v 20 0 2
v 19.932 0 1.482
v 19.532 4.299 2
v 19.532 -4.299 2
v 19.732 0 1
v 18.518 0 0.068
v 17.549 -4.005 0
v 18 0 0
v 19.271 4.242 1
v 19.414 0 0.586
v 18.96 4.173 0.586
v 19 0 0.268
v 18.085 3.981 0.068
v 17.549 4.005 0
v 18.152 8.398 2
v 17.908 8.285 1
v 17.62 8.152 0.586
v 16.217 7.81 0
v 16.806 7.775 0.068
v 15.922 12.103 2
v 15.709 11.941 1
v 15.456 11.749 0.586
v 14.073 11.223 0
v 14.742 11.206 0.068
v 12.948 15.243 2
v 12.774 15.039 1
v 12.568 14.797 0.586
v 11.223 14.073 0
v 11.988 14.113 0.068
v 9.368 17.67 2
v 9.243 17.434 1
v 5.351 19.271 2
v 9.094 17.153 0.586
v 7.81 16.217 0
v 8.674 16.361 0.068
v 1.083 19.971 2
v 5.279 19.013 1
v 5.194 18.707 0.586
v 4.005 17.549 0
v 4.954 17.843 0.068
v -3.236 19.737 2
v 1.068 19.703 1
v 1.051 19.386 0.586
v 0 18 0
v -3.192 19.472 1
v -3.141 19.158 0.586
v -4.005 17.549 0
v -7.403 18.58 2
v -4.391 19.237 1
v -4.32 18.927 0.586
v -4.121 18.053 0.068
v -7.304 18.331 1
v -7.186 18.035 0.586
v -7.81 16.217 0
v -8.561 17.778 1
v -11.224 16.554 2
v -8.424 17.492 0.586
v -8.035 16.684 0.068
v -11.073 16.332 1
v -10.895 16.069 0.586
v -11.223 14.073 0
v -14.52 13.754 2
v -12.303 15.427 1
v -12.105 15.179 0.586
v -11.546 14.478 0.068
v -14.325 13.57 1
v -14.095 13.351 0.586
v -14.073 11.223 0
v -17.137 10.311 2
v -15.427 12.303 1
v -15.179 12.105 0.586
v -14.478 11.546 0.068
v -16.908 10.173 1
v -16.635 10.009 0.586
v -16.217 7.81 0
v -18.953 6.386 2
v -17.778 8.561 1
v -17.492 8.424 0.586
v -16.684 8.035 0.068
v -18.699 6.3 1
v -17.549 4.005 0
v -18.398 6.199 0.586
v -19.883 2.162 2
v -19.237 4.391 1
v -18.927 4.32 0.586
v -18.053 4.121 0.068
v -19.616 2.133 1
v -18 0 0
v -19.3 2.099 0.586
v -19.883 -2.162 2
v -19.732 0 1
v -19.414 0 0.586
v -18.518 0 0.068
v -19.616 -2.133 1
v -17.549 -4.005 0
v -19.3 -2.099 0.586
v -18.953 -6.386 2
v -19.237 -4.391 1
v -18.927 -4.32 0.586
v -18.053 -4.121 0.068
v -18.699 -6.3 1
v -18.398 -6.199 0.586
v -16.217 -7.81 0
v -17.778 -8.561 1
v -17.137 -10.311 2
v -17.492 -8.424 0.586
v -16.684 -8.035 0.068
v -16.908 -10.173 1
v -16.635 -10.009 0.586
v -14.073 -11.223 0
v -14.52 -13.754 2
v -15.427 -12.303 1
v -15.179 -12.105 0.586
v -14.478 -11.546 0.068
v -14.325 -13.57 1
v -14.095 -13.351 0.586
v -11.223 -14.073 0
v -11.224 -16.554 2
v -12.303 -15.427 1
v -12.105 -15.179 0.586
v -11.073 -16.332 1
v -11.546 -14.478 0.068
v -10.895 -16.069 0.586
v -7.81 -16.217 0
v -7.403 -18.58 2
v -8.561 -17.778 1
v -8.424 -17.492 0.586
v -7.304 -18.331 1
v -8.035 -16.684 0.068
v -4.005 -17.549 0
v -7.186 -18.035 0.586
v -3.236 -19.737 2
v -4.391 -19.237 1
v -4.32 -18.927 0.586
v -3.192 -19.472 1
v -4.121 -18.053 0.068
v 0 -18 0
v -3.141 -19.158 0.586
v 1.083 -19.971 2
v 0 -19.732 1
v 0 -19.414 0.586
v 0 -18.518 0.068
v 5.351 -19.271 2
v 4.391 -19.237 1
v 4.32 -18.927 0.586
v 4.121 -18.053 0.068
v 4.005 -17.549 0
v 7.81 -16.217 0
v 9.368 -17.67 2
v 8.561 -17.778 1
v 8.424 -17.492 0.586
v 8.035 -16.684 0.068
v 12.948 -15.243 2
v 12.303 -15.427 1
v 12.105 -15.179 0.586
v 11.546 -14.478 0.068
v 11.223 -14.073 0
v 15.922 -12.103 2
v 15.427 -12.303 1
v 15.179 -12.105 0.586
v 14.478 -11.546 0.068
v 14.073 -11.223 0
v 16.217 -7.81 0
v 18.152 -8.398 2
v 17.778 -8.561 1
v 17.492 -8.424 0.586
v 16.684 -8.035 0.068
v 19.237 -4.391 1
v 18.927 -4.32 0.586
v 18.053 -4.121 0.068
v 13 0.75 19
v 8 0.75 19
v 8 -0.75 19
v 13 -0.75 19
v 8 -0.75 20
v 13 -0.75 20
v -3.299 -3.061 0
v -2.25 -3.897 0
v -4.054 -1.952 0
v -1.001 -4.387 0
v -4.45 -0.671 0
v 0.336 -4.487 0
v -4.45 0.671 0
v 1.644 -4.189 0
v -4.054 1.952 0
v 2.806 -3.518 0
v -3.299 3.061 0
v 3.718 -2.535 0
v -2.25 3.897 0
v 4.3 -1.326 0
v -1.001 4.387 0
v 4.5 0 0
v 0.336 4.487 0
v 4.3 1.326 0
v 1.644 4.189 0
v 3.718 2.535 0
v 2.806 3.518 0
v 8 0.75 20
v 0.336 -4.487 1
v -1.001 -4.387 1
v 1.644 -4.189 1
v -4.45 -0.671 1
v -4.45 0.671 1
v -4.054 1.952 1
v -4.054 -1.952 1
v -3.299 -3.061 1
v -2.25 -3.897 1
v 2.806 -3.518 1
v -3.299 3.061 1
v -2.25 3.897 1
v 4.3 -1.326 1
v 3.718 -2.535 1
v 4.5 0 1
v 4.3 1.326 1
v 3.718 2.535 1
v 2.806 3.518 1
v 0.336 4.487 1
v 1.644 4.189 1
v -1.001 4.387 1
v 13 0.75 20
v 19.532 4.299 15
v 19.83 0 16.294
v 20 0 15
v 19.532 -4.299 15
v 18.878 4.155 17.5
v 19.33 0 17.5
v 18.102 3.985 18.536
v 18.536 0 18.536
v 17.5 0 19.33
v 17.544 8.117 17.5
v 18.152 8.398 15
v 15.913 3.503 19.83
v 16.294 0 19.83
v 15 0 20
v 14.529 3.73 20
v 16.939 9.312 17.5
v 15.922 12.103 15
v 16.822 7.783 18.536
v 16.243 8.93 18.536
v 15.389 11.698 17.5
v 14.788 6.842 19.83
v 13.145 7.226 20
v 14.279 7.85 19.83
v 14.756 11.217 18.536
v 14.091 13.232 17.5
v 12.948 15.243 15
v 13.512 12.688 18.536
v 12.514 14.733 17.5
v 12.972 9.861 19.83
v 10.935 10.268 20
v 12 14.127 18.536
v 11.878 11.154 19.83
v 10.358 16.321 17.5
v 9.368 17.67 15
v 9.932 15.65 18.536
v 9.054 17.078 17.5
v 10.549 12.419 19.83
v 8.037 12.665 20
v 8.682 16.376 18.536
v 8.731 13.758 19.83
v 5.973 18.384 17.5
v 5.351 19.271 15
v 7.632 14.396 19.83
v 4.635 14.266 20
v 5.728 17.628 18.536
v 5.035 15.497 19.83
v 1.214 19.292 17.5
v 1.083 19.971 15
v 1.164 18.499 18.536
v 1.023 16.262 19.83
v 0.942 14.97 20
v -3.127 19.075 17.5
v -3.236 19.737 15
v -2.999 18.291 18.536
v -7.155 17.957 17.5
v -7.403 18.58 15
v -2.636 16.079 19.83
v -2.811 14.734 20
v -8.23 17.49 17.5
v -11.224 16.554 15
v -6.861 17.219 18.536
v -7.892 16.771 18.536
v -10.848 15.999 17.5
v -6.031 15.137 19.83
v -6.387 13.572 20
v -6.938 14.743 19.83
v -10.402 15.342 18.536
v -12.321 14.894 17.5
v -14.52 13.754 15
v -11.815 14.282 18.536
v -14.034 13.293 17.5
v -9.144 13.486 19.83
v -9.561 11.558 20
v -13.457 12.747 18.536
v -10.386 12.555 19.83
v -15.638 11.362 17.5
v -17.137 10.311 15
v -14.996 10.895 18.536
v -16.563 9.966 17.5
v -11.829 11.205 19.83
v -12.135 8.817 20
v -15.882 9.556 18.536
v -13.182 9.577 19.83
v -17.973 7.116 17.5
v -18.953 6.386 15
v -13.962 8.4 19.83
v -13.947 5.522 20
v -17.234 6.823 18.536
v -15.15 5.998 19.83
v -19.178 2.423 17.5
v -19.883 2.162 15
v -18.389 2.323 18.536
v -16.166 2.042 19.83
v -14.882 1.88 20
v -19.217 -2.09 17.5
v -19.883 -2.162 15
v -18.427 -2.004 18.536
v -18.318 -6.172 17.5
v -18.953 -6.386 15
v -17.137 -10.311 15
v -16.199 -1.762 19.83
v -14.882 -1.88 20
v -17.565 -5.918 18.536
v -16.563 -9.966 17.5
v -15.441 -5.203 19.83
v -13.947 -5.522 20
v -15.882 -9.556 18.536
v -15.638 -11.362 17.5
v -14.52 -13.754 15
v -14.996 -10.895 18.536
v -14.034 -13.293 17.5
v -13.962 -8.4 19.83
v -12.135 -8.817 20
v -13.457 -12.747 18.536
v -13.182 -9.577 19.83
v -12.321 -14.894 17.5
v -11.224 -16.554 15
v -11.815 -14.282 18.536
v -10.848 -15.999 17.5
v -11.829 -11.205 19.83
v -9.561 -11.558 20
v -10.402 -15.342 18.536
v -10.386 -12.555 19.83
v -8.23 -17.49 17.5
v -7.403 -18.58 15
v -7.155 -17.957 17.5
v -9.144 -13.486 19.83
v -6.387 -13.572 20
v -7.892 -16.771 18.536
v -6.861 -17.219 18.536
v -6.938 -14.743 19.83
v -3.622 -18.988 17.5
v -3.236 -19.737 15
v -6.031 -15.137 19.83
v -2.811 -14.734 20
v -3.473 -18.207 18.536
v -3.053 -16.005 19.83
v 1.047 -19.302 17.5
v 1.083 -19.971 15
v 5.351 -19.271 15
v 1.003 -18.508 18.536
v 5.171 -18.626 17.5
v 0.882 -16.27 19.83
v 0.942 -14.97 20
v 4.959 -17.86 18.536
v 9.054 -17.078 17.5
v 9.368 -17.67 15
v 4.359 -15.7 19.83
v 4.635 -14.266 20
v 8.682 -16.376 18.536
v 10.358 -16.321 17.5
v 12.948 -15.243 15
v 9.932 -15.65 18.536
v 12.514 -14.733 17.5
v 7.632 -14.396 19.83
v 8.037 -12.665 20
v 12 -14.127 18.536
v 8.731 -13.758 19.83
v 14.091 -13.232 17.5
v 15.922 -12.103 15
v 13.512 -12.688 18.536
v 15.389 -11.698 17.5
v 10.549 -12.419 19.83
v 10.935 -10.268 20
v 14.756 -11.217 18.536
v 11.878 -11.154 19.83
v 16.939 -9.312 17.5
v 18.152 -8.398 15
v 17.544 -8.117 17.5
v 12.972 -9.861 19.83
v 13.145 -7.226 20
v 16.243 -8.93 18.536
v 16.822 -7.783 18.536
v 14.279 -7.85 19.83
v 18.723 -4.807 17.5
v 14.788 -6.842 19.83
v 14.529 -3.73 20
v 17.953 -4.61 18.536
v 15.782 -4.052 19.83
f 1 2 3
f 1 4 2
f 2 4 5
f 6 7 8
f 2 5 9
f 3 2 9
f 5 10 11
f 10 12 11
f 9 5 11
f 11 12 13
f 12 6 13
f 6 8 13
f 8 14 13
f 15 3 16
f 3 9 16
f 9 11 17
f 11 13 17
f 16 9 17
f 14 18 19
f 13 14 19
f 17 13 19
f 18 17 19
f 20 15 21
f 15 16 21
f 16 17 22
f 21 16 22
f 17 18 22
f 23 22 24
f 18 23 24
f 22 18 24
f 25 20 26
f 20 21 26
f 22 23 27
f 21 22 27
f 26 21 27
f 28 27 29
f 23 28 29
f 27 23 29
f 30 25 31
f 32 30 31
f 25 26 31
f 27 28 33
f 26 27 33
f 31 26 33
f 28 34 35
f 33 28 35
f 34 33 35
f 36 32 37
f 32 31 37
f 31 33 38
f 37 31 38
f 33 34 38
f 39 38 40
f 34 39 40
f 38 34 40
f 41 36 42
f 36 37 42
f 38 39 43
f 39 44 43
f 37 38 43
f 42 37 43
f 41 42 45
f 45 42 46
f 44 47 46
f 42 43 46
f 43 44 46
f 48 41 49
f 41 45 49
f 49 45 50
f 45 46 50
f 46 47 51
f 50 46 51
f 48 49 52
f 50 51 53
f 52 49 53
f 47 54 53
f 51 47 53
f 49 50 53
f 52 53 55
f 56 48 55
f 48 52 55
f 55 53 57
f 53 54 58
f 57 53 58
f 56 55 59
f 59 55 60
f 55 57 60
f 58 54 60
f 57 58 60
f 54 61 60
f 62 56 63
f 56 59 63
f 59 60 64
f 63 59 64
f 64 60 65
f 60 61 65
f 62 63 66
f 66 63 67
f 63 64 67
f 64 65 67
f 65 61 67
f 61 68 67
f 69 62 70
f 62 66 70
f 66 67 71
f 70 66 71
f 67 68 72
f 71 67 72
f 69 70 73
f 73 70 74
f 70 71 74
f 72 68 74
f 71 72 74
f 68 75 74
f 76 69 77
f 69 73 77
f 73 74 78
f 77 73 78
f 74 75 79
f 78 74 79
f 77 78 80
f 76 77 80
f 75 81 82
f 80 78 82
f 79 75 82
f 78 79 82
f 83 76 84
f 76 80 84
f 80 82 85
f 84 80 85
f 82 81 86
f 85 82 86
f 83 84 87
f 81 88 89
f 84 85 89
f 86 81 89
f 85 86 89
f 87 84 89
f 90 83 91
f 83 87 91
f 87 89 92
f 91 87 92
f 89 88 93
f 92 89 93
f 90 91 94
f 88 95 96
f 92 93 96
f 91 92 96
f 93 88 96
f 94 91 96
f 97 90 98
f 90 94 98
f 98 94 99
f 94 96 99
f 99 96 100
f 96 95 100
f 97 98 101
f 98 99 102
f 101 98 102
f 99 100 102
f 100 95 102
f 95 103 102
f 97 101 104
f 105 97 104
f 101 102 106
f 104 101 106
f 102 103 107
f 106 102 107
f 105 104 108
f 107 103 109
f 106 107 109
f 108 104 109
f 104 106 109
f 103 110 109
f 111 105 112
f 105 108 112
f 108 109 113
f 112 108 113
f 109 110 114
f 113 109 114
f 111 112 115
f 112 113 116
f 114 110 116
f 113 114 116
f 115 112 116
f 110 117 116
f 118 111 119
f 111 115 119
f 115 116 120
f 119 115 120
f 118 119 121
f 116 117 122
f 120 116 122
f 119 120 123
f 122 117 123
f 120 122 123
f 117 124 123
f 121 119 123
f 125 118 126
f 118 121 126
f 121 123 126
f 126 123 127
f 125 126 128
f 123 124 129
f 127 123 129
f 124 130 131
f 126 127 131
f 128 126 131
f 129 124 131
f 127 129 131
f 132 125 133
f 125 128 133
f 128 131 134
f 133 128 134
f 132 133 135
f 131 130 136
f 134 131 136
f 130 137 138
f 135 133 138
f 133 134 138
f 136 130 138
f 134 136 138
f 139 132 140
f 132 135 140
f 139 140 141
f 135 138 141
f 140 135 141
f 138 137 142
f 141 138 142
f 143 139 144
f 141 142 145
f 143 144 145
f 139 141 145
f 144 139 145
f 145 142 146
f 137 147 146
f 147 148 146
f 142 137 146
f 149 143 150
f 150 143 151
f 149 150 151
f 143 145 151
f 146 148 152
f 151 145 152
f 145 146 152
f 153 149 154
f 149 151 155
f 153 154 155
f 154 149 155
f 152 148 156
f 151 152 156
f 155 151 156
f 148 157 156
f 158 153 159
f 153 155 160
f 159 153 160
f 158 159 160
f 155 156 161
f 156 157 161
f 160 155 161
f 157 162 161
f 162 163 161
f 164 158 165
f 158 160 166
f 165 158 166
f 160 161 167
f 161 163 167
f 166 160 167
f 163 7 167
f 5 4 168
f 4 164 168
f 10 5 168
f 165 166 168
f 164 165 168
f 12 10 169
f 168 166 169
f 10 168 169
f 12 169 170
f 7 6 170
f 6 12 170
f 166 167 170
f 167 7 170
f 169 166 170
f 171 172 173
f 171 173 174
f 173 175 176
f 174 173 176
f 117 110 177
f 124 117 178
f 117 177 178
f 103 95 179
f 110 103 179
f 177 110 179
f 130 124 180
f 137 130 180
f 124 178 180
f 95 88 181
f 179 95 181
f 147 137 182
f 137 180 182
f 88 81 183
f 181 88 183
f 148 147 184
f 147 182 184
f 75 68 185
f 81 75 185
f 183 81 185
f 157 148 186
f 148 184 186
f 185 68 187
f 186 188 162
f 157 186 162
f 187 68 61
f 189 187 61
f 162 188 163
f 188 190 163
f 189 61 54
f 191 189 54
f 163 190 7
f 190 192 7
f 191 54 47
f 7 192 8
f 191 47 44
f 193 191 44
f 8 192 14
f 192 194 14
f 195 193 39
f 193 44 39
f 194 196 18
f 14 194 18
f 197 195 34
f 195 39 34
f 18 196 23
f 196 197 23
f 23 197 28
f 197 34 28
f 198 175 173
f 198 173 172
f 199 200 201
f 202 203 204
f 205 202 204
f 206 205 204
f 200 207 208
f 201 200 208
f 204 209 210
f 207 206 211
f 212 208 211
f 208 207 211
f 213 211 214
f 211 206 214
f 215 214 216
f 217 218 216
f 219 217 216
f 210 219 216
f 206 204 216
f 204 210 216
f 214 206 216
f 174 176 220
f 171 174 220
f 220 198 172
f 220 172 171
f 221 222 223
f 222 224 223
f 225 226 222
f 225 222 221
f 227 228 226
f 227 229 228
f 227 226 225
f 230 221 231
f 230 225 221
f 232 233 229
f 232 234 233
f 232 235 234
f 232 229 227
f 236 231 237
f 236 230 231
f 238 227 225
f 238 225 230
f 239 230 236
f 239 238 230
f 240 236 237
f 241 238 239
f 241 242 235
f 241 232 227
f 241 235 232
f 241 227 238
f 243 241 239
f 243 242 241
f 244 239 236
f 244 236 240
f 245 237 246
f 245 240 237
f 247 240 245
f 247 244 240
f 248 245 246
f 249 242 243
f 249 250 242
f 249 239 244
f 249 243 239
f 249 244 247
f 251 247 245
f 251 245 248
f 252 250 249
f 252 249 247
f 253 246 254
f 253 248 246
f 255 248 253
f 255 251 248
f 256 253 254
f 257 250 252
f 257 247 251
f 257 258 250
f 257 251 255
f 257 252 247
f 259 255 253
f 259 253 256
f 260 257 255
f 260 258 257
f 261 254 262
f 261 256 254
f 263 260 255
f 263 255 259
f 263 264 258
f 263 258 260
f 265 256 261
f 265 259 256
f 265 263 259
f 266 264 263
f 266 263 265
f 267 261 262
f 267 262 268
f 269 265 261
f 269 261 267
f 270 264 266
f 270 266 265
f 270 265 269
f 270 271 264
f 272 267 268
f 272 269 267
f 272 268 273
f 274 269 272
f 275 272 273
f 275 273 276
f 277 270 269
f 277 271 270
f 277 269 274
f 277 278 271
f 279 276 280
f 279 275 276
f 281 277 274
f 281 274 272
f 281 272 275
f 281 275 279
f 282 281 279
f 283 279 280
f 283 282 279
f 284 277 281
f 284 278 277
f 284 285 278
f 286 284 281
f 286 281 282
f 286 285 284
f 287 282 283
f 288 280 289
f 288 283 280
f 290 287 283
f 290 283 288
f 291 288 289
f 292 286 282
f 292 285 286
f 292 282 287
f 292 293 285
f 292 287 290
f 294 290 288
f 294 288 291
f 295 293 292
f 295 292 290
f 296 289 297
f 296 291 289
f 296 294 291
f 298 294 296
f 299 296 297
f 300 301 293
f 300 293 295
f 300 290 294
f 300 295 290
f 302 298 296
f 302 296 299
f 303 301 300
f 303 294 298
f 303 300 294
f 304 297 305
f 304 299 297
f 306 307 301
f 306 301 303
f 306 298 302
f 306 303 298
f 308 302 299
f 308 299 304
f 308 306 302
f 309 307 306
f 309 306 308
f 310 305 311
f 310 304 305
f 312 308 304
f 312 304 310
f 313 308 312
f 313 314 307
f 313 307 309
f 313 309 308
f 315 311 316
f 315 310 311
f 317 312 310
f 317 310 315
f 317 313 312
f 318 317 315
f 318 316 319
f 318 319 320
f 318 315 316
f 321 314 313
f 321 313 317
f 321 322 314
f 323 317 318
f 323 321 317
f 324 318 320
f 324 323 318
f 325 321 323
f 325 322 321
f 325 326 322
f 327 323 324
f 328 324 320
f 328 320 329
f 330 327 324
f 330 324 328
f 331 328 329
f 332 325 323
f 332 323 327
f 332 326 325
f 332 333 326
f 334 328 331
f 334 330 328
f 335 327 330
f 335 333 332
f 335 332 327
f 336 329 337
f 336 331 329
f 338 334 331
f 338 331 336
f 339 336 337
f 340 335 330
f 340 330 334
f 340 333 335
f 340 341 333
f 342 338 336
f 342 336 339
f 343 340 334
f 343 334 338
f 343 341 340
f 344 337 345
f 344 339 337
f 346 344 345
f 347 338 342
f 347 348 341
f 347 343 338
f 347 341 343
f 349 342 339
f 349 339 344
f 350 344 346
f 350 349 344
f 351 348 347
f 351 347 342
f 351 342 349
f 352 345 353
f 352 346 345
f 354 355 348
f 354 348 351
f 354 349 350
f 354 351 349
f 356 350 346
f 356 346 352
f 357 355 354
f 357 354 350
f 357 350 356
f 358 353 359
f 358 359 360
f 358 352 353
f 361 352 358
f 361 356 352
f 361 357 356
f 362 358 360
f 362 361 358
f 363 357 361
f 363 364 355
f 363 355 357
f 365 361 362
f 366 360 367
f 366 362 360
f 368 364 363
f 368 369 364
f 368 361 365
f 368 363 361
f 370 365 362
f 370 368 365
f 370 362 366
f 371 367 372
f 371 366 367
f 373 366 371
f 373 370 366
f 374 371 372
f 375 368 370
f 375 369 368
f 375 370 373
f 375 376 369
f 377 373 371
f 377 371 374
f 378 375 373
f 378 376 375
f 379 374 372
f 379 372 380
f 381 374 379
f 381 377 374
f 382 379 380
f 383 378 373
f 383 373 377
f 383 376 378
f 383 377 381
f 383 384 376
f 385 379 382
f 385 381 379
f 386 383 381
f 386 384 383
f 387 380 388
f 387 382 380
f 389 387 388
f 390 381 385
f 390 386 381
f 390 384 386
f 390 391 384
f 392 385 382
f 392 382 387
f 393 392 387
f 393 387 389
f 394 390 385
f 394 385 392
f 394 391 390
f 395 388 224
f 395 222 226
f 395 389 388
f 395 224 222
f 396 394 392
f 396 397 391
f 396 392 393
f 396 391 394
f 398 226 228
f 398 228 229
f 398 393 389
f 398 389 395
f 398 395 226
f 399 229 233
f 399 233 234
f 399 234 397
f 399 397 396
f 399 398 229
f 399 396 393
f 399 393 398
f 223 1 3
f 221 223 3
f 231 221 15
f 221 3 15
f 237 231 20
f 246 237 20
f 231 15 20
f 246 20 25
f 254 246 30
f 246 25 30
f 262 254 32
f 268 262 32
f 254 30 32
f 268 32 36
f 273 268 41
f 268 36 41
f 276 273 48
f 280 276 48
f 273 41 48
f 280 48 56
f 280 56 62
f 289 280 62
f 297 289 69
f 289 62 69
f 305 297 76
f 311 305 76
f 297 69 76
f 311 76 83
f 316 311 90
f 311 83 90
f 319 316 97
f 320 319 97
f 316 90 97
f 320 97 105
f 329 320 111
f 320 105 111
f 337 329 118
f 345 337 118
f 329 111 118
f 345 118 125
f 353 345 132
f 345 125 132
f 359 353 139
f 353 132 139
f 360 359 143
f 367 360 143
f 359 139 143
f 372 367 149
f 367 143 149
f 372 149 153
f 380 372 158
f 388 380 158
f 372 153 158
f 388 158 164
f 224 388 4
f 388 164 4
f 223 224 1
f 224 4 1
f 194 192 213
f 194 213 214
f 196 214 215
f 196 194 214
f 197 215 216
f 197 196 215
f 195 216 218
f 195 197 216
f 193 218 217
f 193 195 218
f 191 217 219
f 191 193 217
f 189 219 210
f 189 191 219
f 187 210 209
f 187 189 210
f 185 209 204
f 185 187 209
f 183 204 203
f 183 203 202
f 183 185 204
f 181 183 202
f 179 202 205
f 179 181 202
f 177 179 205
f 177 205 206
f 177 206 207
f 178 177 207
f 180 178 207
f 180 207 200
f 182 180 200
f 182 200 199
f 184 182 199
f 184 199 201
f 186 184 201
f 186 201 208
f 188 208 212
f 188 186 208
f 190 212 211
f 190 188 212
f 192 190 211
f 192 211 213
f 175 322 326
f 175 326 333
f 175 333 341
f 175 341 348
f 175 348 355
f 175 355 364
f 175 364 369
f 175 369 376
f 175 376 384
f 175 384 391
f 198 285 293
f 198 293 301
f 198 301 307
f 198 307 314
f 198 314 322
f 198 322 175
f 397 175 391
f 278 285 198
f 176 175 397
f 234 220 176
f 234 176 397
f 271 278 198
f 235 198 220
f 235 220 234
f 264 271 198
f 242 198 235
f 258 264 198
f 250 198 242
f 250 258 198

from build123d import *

# Parameters (mm, degrees)
SKETCH_R        = 20
PAD_DEPTH       = 20
SKETCH001_R     = 4.5
POCKET_DEPTH    = 1
FILLET_R        = 5
FILLET001_R     = 2
SKETCH002_W     = 5
SKETCH002_H     = 1.5
POCKET001_DEPTH = 1


with BuildPart() as part:
    # Sketch → Pad (new body)
    with BuildSketch(Plane.XY):
        Circle(SKETCH_R)
    extrude(amount=PAD_DEPTH)

    # Sketch001 → Pocket (cut)
    with BuildSketch(Plane.XY):
        Circle(SKETCH001_R)
    extrude(amount=POCKET_DEPTH, mode=Mode.SUBTRACT)

    # Fillet
    fillet_edges = [part.edges().sort_by_distance(p)[0] for p in [
        (-20, 0, 20),
    ]]
    fillet(fillet_edges, radius=FILLET_R)

    # Fillet001
    fillet001_edges = [part.edges().sort_by_distance(p)[0] for p in [
        (-20, 0, 0),
    ]]
    fillet(fillet001_edges, radius=FILLET001_R)

    # Sketch002 → Pocket001 (cut)
    with BuildSketch(Plane.XY.offset(20)):
        with Locations((10.5, 0)):
            Rectangle(SKETCH002_W, SKETCH002_H)
    extrude(amount=-POCKET001_DEPTH, mode=Mode.SUBTRACT)


solid = part.part
